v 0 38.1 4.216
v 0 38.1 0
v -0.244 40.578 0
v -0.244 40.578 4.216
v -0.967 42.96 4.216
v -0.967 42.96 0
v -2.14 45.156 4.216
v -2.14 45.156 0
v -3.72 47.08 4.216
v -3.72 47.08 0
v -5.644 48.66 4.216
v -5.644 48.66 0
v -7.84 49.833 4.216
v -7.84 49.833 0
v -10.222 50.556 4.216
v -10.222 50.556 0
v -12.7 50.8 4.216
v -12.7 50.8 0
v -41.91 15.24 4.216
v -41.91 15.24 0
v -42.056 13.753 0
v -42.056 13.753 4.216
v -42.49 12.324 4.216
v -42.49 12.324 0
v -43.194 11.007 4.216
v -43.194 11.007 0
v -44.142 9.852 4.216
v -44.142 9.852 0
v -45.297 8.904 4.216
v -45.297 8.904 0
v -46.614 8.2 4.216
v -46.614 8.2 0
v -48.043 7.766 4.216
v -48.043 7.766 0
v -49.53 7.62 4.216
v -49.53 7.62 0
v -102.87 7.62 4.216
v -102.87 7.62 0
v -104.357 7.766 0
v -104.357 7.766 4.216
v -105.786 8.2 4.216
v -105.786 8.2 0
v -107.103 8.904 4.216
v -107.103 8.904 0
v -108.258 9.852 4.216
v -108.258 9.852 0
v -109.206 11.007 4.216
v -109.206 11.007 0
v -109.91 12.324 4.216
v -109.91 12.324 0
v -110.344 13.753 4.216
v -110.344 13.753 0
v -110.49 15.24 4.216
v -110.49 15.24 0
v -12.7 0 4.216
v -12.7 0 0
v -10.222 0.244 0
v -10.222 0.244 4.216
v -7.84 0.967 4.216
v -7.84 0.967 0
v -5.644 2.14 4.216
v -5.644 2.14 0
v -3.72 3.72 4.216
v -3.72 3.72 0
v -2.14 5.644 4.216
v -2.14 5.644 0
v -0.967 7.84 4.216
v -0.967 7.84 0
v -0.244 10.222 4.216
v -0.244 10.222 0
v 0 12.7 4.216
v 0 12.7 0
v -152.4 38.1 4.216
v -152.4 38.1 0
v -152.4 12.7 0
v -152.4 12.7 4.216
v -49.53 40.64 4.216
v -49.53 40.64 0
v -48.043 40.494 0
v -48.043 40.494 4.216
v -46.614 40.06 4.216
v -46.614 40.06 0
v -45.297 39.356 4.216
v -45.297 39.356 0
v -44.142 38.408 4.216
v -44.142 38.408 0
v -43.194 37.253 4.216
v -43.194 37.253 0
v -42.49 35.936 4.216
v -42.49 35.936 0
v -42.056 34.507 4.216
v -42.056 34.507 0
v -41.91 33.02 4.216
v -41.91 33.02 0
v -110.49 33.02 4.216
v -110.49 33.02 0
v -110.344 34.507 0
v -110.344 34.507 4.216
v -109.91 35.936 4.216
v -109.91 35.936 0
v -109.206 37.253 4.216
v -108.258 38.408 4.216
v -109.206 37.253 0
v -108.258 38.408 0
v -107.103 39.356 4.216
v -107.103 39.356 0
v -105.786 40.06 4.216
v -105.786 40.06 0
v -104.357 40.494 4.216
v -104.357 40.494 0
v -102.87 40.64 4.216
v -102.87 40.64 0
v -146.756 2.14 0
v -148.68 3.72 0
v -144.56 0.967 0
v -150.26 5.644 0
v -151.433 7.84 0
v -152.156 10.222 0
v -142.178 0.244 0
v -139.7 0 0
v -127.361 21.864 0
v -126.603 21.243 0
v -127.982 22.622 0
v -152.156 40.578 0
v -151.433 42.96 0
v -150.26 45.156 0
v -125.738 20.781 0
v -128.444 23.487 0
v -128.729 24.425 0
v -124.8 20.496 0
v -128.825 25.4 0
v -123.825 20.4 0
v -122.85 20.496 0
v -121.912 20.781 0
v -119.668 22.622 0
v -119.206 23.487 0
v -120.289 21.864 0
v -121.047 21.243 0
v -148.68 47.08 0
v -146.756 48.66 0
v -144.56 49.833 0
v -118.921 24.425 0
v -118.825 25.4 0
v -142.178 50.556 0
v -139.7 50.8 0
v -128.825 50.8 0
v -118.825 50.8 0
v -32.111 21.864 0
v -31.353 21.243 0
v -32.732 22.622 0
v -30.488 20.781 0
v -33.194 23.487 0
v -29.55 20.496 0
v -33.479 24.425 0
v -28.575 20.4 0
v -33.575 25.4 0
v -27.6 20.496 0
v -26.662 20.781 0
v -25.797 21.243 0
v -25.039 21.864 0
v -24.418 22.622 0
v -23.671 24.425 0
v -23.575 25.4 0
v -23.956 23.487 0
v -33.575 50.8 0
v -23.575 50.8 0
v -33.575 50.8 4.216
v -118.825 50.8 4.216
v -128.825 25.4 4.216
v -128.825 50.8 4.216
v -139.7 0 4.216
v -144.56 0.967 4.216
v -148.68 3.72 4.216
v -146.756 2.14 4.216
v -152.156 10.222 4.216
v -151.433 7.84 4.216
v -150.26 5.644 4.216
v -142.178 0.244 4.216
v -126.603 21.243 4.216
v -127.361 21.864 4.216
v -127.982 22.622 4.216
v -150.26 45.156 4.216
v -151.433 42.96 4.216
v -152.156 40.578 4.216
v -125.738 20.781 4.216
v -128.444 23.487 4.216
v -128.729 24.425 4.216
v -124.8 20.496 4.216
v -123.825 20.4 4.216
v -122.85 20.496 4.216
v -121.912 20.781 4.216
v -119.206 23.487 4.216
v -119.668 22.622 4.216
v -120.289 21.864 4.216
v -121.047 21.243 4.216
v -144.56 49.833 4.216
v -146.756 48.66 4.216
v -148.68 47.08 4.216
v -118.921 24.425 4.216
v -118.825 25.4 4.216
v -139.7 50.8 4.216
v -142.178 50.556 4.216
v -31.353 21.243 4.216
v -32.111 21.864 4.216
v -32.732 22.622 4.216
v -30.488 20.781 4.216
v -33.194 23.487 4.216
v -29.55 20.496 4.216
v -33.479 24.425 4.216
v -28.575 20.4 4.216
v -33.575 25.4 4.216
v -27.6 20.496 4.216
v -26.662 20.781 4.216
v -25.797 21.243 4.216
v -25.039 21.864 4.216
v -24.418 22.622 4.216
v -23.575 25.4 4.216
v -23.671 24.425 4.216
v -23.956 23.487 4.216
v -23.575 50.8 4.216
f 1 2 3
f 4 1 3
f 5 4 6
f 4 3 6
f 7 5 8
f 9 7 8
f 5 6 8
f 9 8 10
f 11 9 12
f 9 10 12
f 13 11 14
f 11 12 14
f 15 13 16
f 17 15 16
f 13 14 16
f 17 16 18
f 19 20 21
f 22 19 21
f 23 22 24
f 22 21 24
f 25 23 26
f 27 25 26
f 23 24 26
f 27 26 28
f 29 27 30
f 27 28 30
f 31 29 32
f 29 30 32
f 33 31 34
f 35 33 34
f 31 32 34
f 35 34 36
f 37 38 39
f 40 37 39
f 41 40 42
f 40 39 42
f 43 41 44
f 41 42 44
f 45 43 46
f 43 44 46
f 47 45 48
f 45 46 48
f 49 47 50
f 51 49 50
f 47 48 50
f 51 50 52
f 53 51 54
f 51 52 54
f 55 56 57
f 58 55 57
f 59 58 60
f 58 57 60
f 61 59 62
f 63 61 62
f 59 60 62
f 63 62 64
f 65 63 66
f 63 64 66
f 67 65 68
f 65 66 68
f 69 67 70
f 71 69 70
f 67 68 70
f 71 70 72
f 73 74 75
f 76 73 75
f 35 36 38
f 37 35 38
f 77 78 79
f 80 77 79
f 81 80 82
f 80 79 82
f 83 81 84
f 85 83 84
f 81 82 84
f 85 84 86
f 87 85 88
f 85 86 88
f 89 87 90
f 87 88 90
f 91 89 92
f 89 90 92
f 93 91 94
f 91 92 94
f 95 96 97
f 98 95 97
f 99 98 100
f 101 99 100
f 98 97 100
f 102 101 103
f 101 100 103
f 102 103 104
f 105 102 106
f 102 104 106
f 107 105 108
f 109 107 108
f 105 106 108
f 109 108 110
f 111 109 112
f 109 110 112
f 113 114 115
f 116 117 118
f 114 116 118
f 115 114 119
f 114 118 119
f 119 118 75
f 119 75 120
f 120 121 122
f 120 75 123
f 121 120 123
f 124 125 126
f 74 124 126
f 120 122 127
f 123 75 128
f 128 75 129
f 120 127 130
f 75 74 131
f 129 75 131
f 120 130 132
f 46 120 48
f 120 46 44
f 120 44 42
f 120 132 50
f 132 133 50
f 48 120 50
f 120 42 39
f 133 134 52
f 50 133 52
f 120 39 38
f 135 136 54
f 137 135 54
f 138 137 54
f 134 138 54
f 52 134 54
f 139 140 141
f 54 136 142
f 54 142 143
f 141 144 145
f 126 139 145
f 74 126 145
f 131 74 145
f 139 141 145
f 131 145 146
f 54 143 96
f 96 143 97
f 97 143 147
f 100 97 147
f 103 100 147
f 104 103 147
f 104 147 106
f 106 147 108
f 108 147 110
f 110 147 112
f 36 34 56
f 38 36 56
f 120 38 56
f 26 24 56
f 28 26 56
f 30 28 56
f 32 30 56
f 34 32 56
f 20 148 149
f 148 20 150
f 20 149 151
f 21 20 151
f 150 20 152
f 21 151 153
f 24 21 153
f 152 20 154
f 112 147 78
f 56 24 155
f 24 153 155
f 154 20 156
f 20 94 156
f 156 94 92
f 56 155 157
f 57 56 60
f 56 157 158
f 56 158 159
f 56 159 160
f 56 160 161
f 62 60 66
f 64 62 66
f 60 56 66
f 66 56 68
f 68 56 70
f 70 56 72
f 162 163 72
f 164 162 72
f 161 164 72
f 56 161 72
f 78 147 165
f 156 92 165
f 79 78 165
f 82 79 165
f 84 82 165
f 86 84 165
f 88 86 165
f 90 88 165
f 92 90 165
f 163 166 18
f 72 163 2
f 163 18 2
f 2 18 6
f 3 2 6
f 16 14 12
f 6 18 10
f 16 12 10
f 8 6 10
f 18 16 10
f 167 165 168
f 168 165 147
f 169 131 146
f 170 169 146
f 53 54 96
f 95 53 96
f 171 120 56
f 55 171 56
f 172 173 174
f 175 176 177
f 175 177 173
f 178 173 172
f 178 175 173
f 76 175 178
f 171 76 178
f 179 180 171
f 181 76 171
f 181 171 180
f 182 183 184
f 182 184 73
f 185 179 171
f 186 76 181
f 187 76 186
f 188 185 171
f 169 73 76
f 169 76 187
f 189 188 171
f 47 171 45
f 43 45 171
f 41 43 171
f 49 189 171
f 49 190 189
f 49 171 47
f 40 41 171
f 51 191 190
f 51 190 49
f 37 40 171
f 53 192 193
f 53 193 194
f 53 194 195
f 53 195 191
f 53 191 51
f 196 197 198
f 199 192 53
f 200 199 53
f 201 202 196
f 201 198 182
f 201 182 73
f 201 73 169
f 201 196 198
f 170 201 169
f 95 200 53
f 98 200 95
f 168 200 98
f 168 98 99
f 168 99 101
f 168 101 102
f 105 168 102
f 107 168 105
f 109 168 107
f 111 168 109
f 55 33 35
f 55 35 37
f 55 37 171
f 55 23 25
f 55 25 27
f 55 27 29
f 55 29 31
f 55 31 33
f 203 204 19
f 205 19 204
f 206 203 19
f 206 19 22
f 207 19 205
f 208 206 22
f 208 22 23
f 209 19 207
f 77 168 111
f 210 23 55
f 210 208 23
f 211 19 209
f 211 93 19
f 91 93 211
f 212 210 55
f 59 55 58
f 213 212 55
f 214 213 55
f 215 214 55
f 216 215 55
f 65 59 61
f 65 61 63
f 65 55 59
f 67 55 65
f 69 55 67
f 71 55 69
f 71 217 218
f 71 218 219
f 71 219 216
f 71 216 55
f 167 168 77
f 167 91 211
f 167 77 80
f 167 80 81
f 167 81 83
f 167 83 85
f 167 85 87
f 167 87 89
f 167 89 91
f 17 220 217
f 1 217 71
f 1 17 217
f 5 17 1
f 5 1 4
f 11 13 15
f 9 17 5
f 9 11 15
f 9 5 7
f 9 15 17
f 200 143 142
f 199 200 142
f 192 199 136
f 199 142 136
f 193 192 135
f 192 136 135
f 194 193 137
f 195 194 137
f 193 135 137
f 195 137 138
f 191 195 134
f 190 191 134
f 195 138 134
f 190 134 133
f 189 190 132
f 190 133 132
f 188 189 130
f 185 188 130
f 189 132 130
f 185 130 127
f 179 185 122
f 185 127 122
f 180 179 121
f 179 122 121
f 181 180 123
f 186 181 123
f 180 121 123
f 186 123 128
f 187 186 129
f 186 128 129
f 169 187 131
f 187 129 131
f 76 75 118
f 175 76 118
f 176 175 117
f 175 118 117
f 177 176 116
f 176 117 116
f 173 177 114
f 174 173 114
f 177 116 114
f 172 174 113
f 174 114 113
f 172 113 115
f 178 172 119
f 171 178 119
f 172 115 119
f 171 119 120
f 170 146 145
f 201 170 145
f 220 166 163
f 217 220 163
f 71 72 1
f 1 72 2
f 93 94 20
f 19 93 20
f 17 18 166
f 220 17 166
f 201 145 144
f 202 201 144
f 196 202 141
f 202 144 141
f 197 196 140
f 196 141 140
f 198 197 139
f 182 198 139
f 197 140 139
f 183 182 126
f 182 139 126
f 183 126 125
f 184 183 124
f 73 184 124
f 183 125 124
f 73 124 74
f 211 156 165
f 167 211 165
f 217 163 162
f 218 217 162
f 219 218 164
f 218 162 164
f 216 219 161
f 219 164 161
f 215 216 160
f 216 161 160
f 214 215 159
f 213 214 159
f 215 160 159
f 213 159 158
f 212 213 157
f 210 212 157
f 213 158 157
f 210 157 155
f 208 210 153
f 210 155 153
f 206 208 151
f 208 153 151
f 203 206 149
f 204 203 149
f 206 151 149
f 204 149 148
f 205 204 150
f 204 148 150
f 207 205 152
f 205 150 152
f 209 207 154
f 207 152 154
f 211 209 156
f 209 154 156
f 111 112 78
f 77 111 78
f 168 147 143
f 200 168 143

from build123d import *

# Parameters (mm, degrees)
F1_DEPTH = 4.2164


with BuildPart() as f1:
    # F0 (on Top) → F1 (new body)
    with BuildSketch(Plane.XY):
        with BuildLine():
            Line((-128.825, 50.8), (-139.7, 50.8))
            ThreePointArc((-139.7, 50.8), (-148.680256, 47.080256), (-152.4, 38.1))
            Line((-152.4, 38.1), (-152.4, 12.7))
            ThreePointArc((-152.4, 12.7), (-148.680256, 3.719744), (-139.7, 0))
            Line((-139.7, 0), (-12.7, 0))
            ThreePointArc((-12.7, 0), (-3.719744, 3.719744), (0, 12.7))
            Line((0, 12.7), (0, 38.1))
            ThreePointArc((0, 38.1), (-3.719744, 47.080256), (-12.7, 50.8))
            Line((-12.7, 50.8), (-23.575, 50.8))
            Line((-23.575, 50.8), (-23.575, 25.4))
            ThreePointArc((-23.575, 25.4), (-28.575, 20.4), (-33.575, 25.4))
            Line((-33.575, 25.4), (-33.575, 50.8))
            Line((-33.575, 50.8), (-118.825, 50.8))
            Line((-118.825, 50.8), (-118.825, 25.4))
            ThreePointArc((-118.825, 25.4), (-123.825, 20.4), (-128.825, 25.4))
            Line((-128.825, 25.4), (-128.825, 50.8))
        make_face()
        with BuildLine():
            ThreePointArc((-110.49, 33.02), (-108.258154, 38.408154), (-102.87, 40.64))
            Line((-102.87, 40.64), (-49.53, 40.64))
            ThreePointArc((-49.53, 40.64), (-44.141846, 38.408154), (-41.91, 33.02))
            Line((-41.91, 33.02), (-41.91, 15.24))
            ThreePointArc((-41.91, 15.24), (-44.141846, 9.851846), (-49.53, 7.62))
            Line((-49.53, 7.62), (-102.87, 7.62))
            ThreePointArc((-102.87, 7.62), (-108.258154, 9.851846), (-110.49, 15.24))
            Line((-110.49, 15.24), (-110.49, 33.02))
        make_face(mode=Mode.SUBTRACT)
    extrude(amount=F1_DEPTH)


solid = f1.part
